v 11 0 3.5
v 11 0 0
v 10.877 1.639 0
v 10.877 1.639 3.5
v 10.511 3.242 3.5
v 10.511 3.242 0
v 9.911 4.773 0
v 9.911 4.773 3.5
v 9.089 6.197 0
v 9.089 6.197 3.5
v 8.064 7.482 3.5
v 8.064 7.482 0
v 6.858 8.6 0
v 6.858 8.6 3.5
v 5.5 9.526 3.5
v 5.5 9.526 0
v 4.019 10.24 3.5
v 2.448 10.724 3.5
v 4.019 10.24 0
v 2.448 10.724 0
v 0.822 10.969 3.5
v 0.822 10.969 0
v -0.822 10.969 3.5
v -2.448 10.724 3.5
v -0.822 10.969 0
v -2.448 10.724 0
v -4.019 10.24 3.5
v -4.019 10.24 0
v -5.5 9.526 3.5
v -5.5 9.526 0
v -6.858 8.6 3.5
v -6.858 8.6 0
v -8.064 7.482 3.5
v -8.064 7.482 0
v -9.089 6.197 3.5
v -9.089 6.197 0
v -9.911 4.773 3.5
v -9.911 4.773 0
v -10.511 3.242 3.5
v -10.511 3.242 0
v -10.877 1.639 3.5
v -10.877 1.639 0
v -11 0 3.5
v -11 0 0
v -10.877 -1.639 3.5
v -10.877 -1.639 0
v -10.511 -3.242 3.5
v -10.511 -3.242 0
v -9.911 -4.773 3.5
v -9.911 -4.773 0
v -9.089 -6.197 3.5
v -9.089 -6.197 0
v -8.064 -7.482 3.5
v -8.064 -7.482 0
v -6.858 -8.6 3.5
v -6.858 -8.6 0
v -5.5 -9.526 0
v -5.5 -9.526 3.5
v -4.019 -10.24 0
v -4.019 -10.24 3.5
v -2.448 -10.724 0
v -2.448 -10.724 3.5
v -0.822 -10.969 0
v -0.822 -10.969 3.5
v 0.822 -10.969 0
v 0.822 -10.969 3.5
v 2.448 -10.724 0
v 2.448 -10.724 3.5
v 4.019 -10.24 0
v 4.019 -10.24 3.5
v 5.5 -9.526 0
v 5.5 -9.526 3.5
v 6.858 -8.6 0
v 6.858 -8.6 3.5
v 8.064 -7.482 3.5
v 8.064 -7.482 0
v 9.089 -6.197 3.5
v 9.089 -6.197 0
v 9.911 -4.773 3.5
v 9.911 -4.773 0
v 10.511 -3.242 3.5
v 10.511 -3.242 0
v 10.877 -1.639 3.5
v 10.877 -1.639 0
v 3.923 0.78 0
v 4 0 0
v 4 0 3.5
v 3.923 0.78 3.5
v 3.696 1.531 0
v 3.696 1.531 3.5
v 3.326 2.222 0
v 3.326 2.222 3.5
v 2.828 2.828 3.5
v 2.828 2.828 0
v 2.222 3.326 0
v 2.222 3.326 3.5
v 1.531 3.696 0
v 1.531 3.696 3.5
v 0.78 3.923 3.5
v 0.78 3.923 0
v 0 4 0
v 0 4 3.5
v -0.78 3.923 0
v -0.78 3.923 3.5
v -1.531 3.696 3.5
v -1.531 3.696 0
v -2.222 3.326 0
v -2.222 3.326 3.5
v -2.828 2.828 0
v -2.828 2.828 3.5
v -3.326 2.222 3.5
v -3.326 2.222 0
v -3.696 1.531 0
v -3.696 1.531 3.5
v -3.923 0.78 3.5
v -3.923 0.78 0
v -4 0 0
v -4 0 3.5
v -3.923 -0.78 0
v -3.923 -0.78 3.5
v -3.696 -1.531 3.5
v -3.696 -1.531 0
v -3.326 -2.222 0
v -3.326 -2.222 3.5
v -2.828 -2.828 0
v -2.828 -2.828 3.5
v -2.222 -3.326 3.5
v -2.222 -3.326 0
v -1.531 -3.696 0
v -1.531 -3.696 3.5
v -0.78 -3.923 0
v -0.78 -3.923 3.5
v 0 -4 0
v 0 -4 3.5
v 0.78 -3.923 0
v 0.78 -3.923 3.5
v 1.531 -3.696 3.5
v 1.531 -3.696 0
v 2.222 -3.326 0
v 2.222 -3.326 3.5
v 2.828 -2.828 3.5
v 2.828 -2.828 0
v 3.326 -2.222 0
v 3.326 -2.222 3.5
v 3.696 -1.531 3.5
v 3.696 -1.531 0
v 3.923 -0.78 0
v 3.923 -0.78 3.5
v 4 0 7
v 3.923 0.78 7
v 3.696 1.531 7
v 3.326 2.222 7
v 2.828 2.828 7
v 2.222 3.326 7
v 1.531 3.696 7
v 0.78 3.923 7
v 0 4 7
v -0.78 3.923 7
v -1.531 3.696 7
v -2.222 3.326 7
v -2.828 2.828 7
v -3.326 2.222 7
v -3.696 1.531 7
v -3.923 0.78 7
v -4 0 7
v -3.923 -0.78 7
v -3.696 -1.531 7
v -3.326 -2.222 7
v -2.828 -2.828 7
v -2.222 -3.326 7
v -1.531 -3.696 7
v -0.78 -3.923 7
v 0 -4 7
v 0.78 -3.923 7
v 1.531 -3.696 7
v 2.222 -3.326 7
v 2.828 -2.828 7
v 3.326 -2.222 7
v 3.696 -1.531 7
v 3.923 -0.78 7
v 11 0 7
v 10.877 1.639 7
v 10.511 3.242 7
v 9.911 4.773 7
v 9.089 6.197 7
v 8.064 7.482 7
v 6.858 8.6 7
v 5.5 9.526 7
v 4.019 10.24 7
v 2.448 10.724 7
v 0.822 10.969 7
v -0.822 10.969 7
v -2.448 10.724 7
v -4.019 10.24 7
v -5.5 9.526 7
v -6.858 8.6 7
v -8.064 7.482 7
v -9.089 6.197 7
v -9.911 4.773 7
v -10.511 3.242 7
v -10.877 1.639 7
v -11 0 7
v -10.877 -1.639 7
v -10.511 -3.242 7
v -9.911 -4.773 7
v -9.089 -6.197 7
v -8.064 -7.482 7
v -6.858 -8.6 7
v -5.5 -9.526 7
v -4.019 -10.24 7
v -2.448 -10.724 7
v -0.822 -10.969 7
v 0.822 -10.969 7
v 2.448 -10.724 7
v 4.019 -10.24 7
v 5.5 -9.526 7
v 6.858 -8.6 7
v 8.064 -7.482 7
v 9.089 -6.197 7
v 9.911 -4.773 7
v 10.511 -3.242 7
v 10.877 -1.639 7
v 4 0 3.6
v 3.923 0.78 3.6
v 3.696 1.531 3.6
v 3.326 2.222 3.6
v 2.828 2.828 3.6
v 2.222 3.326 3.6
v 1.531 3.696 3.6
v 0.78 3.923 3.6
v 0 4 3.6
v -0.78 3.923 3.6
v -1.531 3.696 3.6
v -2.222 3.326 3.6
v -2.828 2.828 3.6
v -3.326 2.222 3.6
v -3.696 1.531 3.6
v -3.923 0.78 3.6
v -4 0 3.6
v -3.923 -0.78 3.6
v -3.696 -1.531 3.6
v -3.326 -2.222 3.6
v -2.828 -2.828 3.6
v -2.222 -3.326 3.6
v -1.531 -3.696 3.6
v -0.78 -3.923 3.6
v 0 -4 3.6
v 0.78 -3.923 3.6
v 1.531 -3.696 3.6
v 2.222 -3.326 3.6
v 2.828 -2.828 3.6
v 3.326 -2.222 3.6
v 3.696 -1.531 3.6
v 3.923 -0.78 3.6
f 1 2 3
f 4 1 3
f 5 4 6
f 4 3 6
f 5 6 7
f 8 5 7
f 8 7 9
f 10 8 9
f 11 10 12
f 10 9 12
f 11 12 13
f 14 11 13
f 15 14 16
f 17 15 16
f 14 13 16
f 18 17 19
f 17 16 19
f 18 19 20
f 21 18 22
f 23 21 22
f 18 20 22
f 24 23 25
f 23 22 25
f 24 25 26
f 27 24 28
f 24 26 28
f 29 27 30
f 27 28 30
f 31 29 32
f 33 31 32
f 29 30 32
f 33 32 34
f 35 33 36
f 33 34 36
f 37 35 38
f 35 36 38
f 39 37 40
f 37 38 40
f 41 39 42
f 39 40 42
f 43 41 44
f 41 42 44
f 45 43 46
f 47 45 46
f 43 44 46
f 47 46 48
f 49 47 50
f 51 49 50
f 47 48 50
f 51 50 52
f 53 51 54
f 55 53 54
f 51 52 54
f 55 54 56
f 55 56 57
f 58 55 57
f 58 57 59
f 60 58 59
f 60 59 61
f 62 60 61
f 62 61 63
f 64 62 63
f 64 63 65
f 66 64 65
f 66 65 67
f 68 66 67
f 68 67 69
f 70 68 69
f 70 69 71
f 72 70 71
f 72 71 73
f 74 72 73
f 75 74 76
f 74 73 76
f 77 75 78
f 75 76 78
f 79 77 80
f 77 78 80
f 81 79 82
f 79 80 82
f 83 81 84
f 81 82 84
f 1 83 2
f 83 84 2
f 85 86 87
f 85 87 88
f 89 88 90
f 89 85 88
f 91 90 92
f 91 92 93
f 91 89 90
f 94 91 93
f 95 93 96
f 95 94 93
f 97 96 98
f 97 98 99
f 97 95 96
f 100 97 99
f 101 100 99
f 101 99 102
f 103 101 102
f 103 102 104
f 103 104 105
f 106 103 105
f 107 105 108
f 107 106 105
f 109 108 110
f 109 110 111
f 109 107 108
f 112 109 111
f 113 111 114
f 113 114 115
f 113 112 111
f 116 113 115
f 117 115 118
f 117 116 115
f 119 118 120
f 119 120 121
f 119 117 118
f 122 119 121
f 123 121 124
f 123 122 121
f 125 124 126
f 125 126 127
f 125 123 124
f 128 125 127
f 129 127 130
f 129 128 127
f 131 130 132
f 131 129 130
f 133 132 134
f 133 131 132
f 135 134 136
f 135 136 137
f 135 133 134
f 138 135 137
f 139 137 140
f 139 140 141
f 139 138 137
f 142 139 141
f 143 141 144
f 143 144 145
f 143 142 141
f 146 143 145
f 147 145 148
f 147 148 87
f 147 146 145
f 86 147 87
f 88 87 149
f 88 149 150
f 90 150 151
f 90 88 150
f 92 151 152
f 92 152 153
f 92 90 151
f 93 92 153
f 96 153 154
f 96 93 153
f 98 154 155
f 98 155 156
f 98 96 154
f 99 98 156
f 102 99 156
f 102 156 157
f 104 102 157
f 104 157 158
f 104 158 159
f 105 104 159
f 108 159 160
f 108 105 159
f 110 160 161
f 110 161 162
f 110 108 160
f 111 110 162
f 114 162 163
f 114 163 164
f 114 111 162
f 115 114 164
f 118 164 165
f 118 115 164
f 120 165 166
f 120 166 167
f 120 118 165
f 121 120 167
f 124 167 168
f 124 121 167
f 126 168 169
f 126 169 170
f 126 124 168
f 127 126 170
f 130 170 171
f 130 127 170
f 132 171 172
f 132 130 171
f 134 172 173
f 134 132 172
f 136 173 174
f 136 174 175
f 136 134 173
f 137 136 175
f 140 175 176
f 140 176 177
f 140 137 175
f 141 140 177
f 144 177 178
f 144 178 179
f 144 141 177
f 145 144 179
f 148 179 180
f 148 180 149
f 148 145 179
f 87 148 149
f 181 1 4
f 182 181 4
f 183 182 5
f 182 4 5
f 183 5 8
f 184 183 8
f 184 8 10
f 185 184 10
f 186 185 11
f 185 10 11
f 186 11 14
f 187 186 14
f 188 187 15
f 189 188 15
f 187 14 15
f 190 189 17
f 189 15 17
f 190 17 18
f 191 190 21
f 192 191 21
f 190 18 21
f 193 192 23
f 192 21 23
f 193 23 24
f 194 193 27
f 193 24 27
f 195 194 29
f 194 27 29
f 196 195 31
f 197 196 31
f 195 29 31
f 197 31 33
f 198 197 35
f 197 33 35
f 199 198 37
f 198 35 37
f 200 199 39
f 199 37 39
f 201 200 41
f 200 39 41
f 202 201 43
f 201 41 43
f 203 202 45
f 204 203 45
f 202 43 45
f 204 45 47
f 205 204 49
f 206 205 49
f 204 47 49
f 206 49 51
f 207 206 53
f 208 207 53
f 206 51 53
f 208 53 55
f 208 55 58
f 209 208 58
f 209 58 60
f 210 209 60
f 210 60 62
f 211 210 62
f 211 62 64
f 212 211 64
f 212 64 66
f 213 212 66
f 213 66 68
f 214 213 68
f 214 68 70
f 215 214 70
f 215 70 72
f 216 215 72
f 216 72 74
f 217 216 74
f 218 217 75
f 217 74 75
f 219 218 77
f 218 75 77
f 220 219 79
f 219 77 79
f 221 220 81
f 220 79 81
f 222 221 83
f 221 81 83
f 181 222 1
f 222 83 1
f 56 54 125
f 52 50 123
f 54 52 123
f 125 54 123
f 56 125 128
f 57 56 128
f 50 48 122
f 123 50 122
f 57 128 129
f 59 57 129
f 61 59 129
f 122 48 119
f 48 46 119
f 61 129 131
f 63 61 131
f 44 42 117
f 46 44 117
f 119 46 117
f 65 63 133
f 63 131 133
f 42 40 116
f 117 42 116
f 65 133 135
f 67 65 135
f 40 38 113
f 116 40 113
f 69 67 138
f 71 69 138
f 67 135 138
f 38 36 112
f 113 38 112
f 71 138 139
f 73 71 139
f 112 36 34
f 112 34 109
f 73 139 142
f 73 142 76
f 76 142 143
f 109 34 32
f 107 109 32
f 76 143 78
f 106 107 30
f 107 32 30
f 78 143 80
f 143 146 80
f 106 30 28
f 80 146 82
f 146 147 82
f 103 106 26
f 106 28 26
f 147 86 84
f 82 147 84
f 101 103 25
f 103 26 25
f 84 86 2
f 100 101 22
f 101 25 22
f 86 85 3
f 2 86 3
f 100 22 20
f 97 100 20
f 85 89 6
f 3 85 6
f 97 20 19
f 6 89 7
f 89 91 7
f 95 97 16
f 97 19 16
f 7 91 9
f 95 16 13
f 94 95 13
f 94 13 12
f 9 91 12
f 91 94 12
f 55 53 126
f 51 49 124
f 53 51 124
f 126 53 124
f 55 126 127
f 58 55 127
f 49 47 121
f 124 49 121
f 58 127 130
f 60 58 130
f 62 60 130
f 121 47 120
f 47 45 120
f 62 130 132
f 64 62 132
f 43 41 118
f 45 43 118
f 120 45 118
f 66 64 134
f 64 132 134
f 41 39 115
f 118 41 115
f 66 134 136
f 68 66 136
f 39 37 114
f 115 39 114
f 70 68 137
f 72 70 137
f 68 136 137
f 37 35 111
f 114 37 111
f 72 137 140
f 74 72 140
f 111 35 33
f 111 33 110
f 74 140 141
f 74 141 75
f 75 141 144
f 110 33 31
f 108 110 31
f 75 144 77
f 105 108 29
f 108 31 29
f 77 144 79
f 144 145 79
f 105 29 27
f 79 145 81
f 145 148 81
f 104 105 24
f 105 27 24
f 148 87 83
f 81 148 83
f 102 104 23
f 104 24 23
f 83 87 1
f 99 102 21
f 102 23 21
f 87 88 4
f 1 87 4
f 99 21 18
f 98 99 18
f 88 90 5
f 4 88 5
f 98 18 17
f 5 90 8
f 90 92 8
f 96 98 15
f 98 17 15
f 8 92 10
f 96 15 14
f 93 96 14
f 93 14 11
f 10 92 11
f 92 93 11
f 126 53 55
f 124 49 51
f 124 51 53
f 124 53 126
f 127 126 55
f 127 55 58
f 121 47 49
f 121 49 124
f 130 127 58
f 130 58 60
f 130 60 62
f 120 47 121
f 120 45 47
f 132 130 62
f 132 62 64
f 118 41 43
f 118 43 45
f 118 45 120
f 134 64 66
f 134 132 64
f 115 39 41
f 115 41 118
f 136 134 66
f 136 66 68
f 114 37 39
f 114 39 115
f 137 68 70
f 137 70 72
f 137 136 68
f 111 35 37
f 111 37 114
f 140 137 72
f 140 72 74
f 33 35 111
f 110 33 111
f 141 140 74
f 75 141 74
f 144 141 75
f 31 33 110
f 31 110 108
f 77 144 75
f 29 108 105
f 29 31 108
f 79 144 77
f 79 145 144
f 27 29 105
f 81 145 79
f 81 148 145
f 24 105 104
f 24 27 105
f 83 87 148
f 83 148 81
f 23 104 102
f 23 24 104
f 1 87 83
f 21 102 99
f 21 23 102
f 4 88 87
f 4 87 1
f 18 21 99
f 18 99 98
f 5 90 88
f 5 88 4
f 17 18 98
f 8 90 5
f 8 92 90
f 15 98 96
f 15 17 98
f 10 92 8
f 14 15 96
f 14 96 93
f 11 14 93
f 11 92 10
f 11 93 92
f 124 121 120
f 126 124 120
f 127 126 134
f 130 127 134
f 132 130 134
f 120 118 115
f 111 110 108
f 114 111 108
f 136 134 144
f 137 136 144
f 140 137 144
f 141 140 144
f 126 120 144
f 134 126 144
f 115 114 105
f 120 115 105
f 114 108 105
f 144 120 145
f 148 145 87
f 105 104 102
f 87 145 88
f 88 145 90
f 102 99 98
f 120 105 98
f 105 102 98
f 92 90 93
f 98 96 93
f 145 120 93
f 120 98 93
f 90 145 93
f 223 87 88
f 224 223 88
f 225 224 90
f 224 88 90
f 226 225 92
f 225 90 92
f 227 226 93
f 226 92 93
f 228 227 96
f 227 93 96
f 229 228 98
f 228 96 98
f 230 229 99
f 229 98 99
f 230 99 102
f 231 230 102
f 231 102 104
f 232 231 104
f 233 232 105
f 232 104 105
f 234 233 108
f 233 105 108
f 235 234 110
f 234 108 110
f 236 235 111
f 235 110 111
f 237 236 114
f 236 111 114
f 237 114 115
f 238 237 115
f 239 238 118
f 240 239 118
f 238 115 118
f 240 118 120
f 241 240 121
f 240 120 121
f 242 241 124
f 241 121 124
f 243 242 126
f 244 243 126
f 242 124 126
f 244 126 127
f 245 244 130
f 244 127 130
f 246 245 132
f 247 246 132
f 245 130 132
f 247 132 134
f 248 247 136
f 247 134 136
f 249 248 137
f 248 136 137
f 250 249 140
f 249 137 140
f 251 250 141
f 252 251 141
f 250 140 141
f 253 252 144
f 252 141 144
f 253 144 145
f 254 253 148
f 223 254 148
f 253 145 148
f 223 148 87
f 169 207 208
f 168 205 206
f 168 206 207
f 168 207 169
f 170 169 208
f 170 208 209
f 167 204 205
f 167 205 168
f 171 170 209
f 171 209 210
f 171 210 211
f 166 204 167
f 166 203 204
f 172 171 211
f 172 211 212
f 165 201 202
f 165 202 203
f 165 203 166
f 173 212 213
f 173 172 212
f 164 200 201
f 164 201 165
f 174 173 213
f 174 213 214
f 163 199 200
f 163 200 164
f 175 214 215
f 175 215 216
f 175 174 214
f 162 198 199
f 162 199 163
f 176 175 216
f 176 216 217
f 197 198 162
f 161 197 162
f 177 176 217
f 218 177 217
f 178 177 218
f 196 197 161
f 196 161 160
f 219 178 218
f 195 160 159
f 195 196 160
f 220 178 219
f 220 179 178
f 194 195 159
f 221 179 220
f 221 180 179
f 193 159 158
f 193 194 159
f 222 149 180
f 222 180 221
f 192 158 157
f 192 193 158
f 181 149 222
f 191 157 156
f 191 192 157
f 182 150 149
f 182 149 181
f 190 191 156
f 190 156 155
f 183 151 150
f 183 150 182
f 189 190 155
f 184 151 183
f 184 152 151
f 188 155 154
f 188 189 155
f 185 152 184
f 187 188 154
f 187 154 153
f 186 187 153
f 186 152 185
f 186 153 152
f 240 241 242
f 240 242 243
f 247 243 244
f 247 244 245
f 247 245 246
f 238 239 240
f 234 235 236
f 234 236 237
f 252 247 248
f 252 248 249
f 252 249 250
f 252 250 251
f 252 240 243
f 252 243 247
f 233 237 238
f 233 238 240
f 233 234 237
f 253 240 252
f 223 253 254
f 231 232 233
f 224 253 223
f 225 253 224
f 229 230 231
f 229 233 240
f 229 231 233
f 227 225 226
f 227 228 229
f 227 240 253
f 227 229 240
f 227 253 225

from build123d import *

# Parameters (mm, degrees)
F0_R     = 11
F0_R_2   = 4
F1_DEPTH = 3.5
F2_R     = 4
F3_DEPTH = 0.1
F4_R     = 11
F4_R_2   = 4
F5_DEPTH = 3.5


with BuildPart() as f1:
    # F0 (on Top) → F1 (new body)
    with BuildSketch(Plane.XY):
        Circle(F0_R)
        Circle(F0_R_2, mode=Mode.SUBTRACT)
    extrude(amount=F1_DEPTH)


with BuildPart() as f3:
    # F2 (on face) → F3 (new body)
    with BuildSketch(Plane.XY.offset(3.5)):
        Circle(F2_R)
    extrude(amount=F3_DEPTH)


with BuildPart() as f5:
    # F4 (on face) → F5 (new body)
    with BuildSketch(Plane.XY.offset(3.5)):
        Circle(F4_R)
        Circle(F4_R_2, mode=Mode.SUBTRACT)
    extrude(amount=F5_DEPTH)


solid = Compound([f1.part, f3.part, f5.part])
